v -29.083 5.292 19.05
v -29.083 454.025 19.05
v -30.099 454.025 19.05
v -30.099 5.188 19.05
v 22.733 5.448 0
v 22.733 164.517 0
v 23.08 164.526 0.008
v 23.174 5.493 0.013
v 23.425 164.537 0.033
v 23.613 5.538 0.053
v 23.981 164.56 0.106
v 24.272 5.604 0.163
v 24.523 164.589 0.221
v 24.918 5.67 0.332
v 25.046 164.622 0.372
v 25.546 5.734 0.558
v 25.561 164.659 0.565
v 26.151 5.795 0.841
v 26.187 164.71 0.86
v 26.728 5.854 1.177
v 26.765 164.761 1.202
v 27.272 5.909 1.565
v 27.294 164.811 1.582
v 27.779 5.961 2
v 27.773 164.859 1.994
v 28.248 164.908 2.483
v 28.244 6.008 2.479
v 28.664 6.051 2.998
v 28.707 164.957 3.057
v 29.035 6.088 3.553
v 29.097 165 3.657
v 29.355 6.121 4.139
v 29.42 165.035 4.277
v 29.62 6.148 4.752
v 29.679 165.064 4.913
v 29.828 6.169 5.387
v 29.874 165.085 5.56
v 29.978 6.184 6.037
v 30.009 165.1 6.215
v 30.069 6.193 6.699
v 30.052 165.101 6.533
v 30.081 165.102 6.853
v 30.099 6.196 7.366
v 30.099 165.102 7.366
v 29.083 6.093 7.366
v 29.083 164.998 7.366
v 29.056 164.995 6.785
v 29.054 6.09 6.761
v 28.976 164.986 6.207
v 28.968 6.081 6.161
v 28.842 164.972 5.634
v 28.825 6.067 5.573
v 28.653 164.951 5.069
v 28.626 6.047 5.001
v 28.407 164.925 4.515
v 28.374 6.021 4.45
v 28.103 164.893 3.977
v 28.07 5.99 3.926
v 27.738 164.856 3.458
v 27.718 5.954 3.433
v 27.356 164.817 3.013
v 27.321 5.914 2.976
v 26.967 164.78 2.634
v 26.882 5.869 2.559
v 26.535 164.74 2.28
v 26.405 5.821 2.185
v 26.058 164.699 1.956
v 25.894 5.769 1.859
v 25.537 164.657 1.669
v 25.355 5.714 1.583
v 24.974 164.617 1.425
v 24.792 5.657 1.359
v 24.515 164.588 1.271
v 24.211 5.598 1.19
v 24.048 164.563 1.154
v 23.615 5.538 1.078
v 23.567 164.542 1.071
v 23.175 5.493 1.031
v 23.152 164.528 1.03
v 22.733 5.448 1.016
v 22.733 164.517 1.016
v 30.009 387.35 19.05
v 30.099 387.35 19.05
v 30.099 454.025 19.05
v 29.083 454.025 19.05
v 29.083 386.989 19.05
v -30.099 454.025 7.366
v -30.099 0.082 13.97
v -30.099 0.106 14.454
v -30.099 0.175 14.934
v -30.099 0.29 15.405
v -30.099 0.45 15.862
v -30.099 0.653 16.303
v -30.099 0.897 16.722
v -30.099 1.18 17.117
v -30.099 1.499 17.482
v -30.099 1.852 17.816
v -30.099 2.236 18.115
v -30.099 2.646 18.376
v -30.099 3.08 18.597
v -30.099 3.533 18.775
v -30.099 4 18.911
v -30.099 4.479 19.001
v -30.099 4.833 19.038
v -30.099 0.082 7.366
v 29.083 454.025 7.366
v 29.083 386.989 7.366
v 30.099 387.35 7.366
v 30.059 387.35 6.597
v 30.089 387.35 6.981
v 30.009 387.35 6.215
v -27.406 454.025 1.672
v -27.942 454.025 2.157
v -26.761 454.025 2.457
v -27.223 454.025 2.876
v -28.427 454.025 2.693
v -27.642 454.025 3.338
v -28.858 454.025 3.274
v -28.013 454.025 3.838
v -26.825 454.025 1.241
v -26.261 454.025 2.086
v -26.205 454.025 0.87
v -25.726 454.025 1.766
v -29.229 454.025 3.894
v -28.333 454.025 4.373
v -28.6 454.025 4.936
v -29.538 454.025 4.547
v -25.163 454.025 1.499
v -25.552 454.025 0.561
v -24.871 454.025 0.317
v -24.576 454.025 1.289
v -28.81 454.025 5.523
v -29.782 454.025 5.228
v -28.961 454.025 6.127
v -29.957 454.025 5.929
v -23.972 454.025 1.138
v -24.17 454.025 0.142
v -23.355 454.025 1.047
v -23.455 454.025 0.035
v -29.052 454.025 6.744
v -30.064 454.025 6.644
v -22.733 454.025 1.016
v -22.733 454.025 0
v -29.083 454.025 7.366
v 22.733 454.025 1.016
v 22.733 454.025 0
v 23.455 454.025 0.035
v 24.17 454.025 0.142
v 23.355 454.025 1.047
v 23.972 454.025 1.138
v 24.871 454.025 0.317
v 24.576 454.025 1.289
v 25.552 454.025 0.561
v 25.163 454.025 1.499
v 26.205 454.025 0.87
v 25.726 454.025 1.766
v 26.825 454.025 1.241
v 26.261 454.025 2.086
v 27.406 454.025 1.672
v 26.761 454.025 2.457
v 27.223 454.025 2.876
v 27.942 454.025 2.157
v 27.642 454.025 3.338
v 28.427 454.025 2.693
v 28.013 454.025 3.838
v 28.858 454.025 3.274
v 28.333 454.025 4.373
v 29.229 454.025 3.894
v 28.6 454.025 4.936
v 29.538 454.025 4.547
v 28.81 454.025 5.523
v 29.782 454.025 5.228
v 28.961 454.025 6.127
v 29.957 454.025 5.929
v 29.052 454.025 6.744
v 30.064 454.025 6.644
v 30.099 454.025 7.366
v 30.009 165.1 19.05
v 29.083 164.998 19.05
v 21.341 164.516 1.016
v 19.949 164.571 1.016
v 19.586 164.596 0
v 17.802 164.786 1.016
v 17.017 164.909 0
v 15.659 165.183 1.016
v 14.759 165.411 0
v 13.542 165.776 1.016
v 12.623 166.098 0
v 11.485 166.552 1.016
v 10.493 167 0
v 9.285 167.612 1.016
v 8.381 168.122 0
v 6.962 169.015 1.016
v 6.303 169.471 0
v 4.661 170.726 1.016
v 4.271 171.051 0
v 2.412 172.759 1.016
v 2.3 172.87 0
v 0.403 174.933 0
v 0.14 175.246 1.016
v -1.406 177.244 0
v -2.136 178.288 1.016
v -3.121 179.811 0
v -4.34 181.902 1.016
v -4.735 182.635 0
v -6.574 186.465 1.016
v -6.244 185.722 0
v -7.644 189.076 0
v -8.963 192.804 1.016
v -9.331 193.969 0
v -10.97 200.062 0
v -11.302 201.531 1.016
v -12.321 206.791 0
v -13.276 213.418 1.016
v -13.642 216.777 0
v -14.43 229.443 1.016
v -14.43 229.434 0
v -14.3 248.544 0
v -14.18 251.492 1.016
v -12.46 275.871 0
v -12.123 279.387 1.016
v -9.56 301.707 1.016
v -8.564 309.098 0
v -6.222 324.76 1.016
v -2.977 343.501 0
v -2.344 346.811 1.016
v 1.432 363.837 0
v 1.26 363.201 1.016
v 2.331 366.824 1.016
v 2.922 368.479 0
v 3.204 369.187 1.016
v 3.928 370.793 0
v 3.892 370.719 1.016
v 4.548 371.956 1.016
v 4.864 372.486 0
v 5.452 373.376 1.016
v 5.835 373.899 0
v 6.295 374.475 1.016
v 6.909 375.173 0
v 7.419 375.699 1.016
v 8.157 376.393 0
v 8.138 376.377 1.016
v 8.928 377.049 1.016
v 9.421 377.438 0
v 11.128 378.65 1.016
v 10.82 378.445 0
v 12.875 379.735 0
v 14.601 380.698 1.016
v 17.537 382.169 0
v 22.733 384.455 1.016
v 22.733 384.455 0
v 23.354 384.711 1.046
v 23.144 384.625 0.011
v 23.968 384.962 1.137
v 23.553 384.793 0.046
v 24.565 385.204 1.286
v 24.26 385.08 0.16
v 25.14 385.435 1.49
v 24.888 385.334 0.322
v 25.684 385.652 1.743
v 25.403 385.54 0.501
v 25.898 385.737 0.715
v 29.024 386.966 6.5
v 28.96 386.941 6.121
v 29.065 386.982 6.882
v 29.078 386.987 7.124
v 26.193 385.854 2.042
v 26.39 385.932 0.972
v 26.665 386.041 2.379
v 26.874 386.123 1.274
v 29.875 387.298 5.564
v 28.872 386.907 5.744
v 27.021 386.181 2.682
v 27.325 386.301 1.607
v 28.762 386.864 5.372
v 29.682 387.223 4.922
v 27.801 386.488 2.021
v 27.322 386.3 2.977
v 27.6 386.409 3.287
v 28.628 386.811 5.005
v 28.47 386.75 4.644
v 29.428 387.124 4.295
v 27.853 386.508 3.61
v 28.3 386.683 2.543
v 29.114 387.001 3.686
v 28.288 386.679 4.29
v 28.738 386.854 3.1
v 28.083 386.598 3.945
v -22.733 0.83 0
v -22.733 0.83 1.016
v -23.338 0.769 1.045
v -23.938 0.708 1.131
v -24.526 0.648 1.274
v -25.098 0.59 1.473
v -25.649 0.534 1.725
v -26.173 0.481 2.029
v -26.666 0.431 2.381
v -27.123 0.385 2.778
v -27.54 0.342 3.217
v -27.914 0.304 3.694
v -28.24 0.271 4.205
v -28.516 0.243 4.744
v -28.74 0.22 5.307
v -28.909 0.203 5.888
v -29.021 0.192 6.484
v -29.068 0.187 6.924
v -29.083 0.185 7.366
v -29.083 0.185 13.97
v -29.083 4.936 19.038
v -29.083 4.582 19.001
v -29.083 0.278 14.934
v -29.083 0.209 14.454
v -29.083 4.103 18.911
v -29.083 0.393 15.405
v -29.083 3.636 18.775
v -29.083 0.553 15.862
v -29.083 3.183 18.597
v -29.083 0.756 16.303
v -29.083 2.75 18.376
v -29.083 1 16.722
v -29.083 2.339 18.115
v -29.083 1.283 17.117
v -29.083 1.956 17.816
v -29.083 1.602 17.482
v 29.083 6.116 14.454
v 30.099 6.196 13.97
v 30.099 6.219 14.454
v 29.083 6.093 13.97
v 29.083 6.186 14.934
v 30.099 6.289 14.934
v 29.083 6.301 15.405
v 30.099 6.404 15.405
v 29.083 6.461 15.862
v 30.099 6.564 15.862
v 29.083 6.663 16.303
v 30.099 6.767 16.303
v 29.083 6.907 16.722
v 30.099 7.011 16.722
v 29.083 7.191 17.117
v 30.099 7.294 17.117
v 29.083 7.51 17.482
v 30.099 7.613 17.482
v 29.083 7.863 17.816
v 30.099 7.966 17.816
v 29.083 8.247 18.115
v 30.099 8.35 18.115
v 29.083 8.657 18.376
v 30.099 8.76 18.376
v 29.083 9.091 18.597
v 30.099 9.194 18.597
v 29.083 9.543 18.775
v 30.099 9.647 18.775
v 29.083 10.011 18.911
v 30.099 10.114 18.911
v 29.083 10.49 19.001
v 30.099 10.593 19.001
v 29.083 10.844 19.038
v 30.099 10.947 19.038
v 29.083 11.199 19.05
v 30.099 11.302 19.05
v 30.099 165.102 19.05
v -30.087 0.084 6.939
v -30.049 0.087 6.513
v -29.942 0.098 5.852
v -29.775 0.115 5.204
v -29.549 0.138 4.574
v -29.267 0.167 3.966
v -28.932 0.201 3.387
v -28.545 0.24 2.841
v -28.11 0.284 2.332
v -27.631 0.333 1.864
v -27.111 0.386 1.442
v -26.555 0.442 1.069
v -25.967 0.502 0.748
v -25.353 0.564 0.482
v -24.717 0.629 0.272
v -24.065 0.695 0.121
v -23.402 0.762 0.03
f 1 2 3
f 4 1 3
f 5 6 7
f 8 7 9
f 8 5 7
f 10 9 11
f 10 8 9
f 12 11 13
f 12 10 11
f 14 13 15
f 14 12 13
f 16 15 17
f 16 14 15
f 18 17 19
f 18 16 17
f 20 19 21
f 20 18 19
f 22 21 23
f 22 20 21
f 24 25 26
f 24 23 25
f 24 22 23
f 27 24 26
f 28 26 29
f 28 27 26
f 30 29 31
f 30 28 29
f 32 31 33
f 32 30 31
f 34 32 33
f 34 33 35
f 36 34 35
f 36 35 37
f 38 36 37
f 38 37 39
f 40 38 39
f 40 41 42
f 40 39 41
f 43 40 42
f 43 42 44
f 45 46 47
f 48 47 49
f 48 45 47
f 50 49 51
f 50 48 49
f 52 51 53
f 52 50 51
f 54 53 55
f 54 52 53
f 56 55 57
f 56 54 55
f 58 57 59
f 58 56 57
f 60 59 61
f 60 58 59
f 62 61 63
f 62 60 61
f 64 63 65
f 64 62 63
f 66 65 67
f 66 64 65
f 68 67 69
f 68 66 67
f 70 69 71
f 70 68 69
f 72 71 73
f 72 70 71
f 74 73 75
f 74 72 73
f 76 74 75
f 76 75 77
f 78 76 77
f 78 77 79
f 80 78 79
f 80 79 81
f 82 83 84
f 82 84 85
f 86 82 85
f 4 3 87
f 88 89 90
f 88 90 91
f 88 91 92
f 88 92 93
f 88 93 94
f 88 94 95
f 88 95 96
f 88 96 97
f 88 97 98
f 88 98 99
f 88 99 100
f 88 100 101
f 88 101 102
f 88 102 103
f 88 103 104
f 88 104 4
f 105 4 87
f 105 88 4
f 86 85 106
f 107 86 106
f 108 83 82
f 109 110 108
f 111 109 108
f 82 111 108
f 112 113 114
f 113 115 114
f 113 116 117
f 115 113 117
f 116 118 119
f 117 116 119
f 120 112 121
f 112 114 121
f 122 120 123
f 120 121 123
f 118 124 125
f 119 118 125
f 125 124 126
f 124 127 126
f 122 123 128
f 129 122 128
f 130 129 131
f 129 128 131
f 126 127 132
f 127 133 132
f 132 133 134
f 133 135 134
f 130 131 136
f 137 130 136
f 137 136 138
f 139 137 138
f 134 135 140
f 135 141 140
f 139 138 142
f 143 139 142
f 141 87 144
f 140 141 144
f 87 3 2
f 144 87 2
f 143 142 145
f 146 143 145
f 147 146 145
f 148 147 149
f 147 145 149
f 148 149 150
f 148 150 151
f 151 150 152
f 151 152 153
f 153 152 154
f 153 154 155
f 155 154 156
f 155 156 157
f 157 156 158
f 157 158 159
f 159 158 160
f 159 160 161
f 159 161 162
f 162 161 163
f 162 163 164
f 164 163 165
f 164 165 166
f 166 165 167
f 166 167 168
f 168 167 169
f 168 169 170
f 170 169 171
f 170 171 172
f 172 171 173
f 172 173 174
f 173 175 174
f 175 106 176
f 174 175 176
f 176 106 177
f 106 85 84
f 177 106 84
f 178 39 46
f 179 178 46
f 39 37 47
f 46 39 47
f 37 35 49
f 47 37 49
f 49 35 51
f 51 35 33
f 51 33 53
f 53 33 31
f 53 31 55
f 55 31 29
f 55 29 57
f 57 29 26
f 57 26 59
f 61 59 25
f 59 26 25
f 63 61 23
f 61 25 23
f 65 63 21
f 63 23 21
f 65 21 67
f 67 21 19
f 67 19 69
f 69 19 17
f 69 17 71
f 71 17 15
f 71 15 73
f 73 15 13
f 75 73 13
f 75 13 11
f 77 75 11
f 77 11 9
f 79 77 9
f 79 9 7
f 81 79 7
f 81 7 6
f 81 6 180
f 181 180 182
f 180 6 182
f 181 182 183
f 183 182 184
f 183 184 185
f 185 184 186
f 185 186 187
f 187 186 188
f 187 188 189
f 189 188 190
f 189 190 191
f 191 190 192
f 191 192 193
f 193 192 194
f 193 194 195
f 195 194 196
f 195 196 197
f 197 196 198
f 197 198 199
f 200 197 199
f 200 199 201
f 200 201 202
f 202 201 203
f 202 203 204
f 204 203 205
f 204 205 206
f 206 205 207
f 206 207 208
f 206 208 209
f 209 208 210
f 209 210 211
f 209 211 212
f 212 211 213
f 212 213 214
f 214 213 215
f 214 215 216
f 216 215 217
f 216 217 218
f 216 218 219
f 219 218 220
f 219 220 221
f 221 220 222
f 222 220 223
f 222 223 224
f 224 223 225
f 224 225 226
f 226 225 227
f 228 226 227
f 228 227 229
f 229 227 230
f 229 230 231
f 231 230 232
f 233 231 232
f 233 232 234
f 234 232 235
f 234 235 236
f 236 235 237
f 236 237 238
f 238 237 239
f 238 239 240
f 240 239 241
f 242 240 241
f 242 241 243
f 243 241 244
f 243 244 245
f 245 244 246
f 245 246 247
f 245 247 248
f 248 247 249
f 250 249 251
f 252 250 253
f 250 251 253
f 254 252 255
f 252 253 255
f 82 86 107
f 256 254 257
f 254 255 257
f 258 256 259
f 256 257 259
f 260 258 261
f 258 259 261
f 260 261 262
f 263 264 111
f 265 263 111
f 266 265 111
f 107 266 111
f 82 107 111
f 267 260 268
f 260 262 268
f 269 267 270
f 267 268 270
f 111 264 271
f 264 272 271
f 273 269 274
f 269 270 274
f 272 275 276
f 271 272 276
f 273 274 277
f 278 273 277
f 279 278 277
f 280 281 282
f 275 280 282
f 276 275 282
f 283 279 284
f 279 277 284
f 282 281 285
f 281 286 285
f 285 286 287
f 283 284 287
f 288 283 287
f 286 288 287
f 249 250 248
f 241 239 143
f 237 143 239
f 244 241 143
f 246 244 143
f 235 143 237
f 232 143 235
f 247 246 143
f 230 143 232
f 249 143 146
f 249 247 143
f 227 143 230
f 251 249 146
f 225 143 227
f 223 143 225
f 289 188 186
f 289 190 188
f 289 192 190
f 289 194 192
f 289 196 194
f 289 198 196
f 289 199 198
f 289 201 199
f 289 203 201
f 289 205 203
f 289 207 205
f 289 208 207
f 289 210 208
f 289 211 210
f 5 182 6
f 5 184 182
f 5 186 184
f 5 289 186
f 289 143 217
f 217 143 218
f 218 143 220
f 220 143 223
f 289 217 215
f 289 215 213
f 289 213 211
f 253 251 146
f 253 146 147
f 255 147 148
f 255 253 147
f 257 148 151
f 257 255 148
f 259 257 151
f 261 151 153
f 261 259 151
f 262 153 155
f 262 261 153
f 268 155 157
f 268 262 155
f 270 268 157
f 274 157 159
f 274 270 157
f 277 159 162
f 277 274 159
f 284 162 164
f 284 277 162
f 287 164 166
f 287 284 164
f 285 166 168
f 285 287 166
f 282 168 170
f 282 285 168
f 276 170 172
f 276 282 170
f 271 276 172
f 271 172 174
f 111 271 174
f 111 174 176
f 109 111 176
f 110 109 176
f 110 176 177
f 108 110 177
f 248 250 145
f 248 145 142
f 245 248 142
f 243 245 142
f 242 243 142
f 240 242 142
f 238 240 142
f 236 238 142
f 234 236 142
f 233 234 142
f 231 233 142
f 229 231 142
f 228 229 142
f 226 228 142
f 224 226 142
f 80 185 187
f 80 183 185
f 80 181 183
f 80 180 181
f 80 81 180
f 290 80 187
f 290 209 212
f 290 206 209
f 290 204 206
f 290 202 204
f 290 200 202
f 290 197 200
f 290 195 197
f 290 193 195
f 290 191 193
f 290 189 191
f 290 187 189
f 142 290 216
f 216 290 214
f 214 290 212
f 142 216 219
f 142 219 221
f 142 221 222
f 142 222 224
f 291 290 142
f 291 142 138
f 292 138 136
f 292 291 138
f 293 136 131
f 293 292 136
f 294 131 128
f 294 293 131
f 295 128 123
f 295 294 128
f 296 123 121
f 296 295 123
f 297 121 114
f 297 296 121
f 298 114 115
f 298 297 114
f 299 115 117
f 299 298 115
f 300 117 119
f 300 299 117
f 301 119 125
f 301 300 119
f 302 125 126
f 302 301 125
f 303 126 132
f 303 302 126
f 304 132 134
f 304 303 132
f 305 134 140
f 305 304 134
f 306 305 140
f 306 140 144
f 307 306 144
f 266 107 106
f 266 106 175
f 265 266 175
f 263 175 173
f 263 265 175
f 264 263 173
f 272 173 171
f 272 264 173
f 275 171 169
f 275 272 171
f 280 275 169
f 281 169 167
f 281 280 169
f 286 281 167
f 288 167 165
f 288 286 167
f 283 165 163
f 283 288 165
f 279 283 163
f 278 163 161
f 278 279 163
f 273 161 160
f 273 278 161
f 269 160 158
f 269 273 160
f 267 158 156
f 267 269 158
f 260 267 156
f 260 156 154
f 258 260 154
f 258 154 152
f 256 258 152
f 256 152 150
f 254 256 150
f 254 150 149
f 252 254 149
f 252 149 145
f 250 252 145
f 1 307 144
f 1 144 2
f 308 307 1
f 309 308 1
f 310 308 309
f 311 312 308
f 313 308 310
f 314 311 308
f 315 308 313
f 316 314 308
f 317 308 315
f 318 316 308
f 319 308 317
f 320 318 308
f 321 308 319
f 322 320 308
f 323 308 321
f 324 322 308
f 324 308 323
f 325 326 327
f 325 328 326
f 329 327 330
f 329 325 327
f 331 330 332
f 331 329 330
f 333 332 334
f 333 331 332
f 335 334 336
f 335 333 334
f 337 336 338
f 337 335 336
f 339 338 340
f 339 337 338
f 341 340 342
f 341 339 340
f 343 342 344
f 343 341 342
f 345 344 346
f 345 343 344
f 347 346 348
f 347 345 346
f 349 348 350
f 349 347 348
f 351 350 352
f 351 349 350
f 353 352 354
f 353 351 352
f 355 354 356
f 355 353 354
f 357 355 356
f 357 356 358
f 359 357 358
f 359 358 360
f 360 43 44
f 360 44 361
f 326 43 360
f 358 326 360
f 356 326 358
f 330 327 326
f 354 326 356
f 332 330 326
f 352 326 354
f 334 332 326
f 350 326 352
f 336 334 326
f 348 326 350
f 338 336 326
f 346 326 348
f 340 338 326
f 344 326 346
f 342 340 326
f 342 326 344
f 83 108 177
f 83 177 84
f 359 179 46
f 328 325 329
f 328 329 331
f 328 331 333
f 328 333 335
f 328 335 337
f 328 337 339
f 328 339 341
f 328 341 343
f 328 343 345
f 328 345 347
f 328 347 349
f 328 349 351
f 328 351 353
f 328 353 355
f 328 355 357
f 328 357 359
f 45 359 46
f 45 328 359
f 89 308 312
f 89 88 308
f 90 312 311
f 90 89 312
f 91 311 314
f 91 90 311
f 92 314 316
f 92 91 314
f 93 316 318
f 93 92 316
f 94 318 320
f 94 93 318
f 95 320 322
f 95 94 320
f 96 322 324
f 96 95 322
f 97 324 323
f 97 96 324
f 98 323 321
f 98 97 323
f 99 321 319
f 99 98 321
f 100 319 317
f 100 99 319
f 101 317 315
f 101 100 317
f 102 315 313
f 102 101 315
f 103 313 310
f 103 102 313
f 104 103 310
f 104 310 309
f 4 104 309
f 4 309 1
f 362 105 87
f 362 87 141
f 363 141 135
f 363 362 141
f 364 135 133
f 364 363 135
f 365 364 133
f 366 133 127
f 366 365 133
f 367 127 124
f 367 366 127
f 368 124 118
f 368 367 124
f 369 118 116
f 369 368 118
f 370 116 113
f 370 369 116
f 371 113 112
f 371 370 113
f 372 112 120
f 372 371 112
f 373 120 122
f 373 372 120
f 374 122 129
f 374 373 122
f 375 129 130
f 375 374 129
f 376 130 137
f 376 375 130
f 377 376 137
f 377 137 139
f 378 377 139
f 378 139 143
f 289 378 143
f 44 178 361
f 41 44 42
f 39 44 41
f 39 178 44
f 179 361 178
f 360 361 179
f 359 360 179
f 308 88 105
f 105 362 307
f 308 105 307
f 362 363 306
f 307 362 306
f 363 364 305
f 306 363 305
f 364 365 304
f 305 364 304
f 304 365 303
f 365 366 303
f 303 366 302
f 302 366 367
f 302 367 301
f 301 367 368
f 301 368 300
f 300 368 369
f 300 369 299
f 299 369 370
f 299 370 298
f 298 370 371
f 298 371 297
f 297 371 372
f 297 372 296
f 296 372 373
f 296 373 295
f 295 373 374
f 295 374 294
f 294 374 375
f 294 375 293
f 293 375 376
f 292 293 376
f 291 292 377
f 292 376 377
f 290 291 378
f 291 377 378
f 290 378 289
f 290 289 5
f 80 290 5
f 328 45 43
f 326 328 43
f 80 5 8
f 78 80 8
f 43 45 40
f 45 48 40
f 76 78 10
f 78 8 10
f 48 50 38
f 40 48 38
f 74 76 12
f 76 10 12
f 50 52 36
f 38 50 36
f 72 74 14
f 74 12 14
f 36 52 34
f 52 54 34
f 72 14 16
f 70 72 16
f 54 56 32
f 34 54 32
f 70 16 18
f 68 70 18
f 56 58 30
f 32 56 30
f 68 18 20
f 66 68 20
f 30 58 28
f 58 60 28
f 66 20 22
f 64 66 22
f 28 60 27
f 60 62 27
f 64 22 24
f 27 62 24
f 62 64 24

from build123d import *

# Parameters (mm, degrees)
F1_DEPTH      = 454.025
F3_DEPTH      = 19.051
F3_DEPTH_BACK = 686
F5_DEPTH      = 687
F5_DEPTH_BACK = 19.051
F6_R          = 5.08


# Not quite as in the source:
# - an extrude ends at something that could not be found from the text; its depth is read off the source's solid


with BuildPart() as f1:
    # F0 (on Front) → F1 (new body)
    with BuildSketch(Plane.XZ):
        with BuildLine():
            Line((29.083, 19.05), (29.083, 7.366))
            ThreePointArc((29.083, 7.366), (27.2231280605, 2.8758719395), (22.733, 1.016))
            Line((22.733, 1.016), (0, 1.016))
            Line((0, 1.016), (-22.733, 1.016))
            ThreePointArc((-22.733, 1.016), (-27.2231280605, 2.8758719395), (-29.083, 7.366))
            Line((-29.083, 7.366), (-29.083, 19.05))
            Line((-29.083, 19.05), (-30.099, 19.05))
            Line((-30.099, 19.05), (-30.099, 7.366))
            ThreePointArc((-30.099, 7.366), (-27.9415485502, 2.1574514498), (-22.733, 0))
            Line((-22.733, 0), (0, 0))
            Line((0, 0), (22.733, 0))
            ThreePointArc((22.733, 0), (27.9415485502, 2.1574514498), (30.099, 7.366))
            Line((30.099, 7.366), (30.099, 19.05))
            Line((30.099, 19.05), (29.083, 19.05))
        make_face()
    extrude(amount=-F1_DEPTH)

    # F2 (on face) → F3 (cut, two sides)
    with BuildSketch(Plane(origin=(0, 0, 0), x_dir=(1, 0, 0), z_dir=(0, 0, -1))) as f3_sk:
        Polygon((30.6164417416, -6.2488044892), (30.6164417416, 0), (-30.9091024101, 0), align=None)
    extrude(amount=-F3_DEPTH, mode=Mode.SUBTRACT)
    extrude(f3_sk.sketch, amount=F3_DEPTH_BACK, mode=Mode.SUBTRACT)

    # F4 (on Top) → F5 (cut, two sides)
    with BuildSketch(Plane.XY) as f5_sk:
        with BuildLine():
            Line((62.3281411827, 387.35), (30.0085749477, 387.35))
            add(Edge.make_bspline(
                [(30.0085749477, 165.1), (25.391612917, 164.5890872008), (15.3825161545, 163.4814810281), (-5.0321407016, 175.2210203018), (-21.9793035432, 229.6347611818), (-1.9935882921, 356.8923129343), (5.9717389451, 377.9788071194), (21.8185822716, 384.1569840369), (30.0085749477, 387.35)],
                knots=[0, 0, 0, 0, 0.1027234154, 0.2226937536, 0.4288641549, 0.7409489277, 0.8661167817, 1, 1, 1, 1], degree=3))
            Line((30.0085749477, 165.1), (62.3281411827, 165.9812778234))
            Line((62.3281411827, 165.9812778234), (62.3281411827, 387.35))
        make_face()
    extrude(amount=-F5_DEPTH, mode=Mode.SUBTRACT)
    extrude(f5_sk.sketch, amount=F5_DEPTH_BACK, mode=Mode.SUBTRACT)

    # F6
    f6_edges = [f1.edges().sort_by_distance(p)[0] for p in [
        (-29.591, 0.133872, 19.05),
        (29.591, 6.144656, 19.05),
    ]]
    fillet(f6_edges, radius=F6_R)


solid = f1.part
